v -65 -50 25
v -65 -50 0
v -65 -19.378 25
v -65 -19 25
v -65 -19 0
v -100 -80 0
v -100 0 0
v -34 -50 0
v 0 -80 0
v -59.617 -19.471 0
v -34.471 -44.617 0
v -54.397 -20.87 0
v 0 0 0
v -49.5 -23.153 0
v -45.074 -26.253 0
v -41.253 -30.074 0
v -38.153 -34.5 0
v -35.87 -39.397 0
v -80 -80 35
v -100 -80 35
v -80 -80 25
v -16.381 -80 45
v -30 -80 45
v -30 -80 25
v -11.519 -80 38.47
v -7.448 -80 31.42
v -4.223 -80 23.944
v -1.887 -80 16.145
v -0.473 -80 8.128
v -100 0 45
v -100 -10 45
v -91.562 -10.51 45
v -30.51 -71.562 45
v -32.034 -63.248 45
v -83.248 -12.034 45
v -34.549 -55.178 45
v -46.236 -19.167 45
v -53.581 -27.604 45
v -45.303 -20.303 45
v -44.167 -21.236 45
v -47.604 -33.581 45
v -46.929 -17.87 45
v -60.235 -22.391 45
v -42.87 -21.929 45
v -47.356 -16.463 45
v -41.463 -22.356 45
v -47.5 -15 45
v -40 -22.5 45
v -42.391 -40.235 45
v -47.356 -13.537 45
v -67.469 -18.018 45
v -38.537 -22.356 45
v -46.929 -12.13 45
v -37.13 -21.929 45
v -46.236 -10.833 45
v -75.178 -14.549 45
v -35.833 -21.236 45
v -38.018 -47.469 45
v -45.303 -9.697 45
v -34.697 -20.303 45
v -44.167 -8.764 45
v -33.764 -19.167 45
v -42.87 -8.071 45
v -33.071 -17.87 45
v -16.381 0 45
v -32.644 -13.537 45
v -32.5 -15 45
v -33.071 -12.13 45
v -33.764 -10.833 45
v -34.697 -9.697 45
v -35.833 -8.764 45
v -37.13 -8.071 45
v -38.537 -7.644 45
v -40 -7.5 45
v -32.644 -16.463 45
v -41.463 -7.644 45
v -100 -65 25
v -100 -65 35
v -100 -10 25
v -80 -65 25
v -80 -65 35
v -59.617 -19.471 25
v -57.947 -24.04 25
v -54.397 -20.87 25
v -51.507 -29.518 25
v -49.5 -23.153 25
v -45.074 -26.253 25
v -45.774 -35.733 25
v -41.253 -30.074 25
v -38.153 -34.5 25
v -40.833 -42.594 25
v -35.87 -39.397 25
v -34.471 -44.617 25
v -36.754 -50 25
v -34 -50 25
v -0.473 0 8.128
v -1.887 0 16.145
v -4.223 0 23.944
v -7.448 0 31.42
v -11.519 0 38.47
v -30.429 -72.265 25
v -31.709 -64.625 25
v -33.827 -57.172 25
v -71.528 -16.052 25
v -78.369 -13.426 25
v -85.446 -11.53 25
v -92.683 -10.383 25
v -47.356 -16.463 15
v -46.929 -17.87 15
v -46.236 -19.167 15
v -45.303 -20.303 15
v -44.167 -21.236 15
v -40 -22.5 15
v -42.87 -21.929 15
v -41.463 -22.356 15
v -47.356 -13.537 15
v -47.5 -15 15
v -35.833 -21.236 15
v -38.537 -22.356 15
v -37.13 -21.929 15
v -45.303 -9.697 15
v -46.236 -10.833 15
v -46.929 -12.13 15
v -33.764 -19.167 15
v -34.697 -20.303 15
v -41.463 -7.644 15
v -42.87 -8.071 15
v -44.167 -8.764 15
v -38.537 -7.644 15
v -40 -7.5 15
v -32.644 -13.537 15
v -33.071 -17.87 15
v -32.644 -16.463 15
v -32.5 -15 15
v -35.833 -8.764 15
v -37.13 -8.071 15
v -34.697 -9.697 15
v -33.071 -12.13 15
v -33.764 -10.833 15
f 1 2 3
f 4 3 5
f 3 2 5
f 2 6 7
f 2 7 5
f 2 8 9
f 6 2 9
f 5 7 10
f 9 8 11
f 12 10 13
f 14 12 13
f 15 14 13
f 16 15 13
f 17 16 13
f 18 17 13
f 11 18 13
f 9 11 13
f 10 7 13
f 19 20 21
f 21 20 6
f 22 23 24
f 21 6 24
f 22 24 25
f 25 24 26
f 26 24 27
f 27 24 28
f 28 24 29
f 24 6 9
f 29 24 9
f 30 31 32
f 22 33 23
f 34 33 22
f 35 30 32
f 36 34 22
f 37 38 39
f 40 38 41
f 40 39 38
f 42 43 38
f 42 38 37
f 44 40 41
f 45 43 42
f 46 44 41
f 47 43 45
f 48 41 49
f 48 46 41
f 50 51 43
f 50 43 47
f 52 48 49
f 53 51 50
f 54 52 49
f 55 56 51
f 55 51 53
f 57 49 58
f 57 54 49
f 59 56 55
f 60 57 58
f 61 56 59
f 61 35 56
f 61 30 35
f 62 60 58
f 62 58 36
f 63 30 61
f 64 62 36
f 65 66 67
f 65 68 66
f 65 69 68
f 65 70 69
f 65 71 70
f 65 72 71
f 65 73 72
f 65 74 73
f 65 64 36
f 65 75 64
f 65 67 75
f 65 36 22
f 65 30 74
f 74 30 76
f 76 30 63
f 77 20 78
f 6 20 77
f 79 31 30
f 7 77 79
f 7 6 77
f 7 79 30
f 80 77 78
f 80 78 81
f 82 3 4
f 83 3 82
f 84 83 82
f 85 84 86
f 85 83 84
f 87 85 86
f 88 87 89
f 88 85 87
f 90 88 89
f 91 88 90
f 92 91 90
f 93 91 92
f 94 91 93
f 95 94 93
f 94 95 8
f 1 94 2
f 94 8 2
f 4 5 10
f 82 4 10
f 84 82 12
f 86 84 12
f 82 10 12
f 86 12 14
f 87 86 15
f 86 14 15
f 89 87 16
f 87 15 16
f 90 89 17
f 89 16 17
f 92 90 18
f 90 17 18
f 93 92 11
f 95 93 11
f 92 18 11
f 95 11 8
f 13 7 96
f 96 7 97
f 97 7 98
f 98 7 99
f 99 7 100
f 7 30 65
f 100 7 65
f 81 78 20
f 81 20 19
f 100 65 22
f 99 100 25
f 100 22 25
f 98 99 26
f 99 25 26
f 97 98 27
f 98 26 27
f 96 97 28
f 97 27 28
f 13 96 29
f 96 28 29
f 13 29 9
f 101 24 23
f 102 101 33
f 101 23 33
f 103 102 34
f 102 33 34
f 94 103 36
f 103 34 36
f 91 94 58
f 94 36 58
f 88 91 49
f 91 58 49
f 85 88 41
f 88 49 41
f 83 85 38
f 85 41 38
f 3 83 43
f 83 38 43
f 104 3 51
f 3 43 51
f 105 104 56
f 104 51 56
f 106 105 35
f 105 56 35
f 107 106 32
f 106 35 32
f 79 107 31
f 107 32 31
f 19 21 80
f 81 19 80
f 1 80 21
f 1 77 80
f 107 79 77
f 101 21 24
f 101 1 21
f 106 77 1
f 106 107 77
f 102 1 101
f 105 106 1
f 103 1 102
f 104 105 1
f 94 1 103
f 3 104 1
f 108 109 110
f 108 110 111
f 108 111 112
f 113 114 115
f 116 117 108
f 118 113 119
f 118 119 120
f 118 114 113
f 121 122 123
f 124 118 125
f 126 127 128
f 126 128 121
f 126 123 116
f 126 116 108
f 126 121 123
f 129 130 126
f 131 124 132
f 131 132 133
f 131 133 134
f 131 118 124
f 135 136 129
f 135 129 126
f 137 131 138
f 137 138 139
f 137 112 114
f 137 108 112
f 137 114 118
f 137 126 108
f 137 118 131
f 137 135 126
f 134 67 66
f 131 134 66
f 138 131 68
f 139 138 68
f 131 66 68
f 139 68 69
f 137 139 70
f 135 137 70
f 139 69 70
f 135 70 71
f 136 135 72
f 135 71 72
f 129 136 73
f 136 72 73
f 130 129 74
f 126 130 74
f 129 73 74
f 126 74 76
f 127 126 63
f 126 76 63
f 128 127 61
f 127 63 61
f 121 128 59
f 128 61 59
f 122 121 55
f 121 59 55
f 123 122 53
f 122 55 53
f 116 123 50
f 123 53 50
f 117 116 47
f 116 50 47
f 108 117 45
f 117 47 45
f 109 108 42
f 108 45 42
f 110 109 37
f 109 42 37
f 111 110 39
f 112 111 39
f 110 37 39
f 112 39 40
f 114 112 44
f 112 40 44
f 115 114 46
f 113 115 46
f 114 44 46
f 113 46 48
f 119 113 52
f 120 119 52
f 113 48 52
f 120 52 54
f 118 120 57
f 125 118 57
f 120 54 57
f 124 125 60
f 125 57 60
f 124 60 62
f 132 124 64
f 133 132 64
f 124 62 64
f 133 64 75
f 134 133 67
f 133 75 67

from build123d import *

# Parameters (mm, degrees)
F0_W      = 100
F0_H      = 45
F1_DEPTH  = 80
F2_R      = 7.5
F3_DEPTH  = 30
F5_DEPTH  = 20
F6_W      = 20
F6_H      = 15
F7_DEPTH  = 10
F10_DEPTH = 80.001
F11_DEPTH = 25


with BuildPart() as f1:
    # F0 (on Front) → F1 (new body)
    with BuildSketch(Plane.XZ):
        with Locations((-50, 22.5)):
            Rectangle(F0_W, F0_H)
    extrude(amount=F1_DEPTH)

    # F2 (on face) → F3 (cut)
    with BuildSketch(Plane.XY.offset(45)):
        with Locations((-40, -15)):
            Circle(F2_R)
    extrude(amount=-F3_DEPTH, mode=Mode.SUBTRACT)

    # F4 (on face) → F5 (cut)
    with BuildSketch(Plane.XY.offset(45)):
        with BuildLine():
            Line((-100, -80), (-30, -80))
            ThreePointArc((-30, -80), (-50.5025253169, -30.5025253169), (-100, -10))
            Line((-100, -10), (-100, -80))
        make_face()
    extrude(amount=-F5_DEPTH, mode=Mode.SUBTRACT)

    # F6 (on face) → F7 (join)
    with BuildSketch(Plane.XY.offset(25)):
        with Locations((-90, -72.5)):
            Rectangle(F6_W, F6_H)
    extrude(amount=F7_DEPTH)

    # F9 (on face) → F10 (cut, through all)
    with BuildSketch(Plane.XZ.offset(80)):
        with BuildLine():
            ThreePointArc((-16.3809735262, 45), (-4.2226032243, 23.944395449), (0, 0))
            Line((0, 0), (0, 45))
            Line((0, 45), (-16.3809735262, 45))
        make_face()
    extrude(amount=-F10_DEPTH, mode=Mode.SUBTRACT)

    # F8 (on face) → F11 (cut)
    with BuildSketch(Plane(origin=(0, 0, 0), x_dir=(1, 0, 0), z_dir=(0, 0, -1))):
        with BuildLine():
            Line((-34, 50), (-65, 50))
            Line((-65, 50), (-65, 19))
            ThreePointArc((-65, 19), (-43.0796897832, 28.0796897832), (-34, 50))
        make_face()
    extrude(amount=-F11_DEPTH, mode=Mode.SUBTRACT)


solid = f1.part
